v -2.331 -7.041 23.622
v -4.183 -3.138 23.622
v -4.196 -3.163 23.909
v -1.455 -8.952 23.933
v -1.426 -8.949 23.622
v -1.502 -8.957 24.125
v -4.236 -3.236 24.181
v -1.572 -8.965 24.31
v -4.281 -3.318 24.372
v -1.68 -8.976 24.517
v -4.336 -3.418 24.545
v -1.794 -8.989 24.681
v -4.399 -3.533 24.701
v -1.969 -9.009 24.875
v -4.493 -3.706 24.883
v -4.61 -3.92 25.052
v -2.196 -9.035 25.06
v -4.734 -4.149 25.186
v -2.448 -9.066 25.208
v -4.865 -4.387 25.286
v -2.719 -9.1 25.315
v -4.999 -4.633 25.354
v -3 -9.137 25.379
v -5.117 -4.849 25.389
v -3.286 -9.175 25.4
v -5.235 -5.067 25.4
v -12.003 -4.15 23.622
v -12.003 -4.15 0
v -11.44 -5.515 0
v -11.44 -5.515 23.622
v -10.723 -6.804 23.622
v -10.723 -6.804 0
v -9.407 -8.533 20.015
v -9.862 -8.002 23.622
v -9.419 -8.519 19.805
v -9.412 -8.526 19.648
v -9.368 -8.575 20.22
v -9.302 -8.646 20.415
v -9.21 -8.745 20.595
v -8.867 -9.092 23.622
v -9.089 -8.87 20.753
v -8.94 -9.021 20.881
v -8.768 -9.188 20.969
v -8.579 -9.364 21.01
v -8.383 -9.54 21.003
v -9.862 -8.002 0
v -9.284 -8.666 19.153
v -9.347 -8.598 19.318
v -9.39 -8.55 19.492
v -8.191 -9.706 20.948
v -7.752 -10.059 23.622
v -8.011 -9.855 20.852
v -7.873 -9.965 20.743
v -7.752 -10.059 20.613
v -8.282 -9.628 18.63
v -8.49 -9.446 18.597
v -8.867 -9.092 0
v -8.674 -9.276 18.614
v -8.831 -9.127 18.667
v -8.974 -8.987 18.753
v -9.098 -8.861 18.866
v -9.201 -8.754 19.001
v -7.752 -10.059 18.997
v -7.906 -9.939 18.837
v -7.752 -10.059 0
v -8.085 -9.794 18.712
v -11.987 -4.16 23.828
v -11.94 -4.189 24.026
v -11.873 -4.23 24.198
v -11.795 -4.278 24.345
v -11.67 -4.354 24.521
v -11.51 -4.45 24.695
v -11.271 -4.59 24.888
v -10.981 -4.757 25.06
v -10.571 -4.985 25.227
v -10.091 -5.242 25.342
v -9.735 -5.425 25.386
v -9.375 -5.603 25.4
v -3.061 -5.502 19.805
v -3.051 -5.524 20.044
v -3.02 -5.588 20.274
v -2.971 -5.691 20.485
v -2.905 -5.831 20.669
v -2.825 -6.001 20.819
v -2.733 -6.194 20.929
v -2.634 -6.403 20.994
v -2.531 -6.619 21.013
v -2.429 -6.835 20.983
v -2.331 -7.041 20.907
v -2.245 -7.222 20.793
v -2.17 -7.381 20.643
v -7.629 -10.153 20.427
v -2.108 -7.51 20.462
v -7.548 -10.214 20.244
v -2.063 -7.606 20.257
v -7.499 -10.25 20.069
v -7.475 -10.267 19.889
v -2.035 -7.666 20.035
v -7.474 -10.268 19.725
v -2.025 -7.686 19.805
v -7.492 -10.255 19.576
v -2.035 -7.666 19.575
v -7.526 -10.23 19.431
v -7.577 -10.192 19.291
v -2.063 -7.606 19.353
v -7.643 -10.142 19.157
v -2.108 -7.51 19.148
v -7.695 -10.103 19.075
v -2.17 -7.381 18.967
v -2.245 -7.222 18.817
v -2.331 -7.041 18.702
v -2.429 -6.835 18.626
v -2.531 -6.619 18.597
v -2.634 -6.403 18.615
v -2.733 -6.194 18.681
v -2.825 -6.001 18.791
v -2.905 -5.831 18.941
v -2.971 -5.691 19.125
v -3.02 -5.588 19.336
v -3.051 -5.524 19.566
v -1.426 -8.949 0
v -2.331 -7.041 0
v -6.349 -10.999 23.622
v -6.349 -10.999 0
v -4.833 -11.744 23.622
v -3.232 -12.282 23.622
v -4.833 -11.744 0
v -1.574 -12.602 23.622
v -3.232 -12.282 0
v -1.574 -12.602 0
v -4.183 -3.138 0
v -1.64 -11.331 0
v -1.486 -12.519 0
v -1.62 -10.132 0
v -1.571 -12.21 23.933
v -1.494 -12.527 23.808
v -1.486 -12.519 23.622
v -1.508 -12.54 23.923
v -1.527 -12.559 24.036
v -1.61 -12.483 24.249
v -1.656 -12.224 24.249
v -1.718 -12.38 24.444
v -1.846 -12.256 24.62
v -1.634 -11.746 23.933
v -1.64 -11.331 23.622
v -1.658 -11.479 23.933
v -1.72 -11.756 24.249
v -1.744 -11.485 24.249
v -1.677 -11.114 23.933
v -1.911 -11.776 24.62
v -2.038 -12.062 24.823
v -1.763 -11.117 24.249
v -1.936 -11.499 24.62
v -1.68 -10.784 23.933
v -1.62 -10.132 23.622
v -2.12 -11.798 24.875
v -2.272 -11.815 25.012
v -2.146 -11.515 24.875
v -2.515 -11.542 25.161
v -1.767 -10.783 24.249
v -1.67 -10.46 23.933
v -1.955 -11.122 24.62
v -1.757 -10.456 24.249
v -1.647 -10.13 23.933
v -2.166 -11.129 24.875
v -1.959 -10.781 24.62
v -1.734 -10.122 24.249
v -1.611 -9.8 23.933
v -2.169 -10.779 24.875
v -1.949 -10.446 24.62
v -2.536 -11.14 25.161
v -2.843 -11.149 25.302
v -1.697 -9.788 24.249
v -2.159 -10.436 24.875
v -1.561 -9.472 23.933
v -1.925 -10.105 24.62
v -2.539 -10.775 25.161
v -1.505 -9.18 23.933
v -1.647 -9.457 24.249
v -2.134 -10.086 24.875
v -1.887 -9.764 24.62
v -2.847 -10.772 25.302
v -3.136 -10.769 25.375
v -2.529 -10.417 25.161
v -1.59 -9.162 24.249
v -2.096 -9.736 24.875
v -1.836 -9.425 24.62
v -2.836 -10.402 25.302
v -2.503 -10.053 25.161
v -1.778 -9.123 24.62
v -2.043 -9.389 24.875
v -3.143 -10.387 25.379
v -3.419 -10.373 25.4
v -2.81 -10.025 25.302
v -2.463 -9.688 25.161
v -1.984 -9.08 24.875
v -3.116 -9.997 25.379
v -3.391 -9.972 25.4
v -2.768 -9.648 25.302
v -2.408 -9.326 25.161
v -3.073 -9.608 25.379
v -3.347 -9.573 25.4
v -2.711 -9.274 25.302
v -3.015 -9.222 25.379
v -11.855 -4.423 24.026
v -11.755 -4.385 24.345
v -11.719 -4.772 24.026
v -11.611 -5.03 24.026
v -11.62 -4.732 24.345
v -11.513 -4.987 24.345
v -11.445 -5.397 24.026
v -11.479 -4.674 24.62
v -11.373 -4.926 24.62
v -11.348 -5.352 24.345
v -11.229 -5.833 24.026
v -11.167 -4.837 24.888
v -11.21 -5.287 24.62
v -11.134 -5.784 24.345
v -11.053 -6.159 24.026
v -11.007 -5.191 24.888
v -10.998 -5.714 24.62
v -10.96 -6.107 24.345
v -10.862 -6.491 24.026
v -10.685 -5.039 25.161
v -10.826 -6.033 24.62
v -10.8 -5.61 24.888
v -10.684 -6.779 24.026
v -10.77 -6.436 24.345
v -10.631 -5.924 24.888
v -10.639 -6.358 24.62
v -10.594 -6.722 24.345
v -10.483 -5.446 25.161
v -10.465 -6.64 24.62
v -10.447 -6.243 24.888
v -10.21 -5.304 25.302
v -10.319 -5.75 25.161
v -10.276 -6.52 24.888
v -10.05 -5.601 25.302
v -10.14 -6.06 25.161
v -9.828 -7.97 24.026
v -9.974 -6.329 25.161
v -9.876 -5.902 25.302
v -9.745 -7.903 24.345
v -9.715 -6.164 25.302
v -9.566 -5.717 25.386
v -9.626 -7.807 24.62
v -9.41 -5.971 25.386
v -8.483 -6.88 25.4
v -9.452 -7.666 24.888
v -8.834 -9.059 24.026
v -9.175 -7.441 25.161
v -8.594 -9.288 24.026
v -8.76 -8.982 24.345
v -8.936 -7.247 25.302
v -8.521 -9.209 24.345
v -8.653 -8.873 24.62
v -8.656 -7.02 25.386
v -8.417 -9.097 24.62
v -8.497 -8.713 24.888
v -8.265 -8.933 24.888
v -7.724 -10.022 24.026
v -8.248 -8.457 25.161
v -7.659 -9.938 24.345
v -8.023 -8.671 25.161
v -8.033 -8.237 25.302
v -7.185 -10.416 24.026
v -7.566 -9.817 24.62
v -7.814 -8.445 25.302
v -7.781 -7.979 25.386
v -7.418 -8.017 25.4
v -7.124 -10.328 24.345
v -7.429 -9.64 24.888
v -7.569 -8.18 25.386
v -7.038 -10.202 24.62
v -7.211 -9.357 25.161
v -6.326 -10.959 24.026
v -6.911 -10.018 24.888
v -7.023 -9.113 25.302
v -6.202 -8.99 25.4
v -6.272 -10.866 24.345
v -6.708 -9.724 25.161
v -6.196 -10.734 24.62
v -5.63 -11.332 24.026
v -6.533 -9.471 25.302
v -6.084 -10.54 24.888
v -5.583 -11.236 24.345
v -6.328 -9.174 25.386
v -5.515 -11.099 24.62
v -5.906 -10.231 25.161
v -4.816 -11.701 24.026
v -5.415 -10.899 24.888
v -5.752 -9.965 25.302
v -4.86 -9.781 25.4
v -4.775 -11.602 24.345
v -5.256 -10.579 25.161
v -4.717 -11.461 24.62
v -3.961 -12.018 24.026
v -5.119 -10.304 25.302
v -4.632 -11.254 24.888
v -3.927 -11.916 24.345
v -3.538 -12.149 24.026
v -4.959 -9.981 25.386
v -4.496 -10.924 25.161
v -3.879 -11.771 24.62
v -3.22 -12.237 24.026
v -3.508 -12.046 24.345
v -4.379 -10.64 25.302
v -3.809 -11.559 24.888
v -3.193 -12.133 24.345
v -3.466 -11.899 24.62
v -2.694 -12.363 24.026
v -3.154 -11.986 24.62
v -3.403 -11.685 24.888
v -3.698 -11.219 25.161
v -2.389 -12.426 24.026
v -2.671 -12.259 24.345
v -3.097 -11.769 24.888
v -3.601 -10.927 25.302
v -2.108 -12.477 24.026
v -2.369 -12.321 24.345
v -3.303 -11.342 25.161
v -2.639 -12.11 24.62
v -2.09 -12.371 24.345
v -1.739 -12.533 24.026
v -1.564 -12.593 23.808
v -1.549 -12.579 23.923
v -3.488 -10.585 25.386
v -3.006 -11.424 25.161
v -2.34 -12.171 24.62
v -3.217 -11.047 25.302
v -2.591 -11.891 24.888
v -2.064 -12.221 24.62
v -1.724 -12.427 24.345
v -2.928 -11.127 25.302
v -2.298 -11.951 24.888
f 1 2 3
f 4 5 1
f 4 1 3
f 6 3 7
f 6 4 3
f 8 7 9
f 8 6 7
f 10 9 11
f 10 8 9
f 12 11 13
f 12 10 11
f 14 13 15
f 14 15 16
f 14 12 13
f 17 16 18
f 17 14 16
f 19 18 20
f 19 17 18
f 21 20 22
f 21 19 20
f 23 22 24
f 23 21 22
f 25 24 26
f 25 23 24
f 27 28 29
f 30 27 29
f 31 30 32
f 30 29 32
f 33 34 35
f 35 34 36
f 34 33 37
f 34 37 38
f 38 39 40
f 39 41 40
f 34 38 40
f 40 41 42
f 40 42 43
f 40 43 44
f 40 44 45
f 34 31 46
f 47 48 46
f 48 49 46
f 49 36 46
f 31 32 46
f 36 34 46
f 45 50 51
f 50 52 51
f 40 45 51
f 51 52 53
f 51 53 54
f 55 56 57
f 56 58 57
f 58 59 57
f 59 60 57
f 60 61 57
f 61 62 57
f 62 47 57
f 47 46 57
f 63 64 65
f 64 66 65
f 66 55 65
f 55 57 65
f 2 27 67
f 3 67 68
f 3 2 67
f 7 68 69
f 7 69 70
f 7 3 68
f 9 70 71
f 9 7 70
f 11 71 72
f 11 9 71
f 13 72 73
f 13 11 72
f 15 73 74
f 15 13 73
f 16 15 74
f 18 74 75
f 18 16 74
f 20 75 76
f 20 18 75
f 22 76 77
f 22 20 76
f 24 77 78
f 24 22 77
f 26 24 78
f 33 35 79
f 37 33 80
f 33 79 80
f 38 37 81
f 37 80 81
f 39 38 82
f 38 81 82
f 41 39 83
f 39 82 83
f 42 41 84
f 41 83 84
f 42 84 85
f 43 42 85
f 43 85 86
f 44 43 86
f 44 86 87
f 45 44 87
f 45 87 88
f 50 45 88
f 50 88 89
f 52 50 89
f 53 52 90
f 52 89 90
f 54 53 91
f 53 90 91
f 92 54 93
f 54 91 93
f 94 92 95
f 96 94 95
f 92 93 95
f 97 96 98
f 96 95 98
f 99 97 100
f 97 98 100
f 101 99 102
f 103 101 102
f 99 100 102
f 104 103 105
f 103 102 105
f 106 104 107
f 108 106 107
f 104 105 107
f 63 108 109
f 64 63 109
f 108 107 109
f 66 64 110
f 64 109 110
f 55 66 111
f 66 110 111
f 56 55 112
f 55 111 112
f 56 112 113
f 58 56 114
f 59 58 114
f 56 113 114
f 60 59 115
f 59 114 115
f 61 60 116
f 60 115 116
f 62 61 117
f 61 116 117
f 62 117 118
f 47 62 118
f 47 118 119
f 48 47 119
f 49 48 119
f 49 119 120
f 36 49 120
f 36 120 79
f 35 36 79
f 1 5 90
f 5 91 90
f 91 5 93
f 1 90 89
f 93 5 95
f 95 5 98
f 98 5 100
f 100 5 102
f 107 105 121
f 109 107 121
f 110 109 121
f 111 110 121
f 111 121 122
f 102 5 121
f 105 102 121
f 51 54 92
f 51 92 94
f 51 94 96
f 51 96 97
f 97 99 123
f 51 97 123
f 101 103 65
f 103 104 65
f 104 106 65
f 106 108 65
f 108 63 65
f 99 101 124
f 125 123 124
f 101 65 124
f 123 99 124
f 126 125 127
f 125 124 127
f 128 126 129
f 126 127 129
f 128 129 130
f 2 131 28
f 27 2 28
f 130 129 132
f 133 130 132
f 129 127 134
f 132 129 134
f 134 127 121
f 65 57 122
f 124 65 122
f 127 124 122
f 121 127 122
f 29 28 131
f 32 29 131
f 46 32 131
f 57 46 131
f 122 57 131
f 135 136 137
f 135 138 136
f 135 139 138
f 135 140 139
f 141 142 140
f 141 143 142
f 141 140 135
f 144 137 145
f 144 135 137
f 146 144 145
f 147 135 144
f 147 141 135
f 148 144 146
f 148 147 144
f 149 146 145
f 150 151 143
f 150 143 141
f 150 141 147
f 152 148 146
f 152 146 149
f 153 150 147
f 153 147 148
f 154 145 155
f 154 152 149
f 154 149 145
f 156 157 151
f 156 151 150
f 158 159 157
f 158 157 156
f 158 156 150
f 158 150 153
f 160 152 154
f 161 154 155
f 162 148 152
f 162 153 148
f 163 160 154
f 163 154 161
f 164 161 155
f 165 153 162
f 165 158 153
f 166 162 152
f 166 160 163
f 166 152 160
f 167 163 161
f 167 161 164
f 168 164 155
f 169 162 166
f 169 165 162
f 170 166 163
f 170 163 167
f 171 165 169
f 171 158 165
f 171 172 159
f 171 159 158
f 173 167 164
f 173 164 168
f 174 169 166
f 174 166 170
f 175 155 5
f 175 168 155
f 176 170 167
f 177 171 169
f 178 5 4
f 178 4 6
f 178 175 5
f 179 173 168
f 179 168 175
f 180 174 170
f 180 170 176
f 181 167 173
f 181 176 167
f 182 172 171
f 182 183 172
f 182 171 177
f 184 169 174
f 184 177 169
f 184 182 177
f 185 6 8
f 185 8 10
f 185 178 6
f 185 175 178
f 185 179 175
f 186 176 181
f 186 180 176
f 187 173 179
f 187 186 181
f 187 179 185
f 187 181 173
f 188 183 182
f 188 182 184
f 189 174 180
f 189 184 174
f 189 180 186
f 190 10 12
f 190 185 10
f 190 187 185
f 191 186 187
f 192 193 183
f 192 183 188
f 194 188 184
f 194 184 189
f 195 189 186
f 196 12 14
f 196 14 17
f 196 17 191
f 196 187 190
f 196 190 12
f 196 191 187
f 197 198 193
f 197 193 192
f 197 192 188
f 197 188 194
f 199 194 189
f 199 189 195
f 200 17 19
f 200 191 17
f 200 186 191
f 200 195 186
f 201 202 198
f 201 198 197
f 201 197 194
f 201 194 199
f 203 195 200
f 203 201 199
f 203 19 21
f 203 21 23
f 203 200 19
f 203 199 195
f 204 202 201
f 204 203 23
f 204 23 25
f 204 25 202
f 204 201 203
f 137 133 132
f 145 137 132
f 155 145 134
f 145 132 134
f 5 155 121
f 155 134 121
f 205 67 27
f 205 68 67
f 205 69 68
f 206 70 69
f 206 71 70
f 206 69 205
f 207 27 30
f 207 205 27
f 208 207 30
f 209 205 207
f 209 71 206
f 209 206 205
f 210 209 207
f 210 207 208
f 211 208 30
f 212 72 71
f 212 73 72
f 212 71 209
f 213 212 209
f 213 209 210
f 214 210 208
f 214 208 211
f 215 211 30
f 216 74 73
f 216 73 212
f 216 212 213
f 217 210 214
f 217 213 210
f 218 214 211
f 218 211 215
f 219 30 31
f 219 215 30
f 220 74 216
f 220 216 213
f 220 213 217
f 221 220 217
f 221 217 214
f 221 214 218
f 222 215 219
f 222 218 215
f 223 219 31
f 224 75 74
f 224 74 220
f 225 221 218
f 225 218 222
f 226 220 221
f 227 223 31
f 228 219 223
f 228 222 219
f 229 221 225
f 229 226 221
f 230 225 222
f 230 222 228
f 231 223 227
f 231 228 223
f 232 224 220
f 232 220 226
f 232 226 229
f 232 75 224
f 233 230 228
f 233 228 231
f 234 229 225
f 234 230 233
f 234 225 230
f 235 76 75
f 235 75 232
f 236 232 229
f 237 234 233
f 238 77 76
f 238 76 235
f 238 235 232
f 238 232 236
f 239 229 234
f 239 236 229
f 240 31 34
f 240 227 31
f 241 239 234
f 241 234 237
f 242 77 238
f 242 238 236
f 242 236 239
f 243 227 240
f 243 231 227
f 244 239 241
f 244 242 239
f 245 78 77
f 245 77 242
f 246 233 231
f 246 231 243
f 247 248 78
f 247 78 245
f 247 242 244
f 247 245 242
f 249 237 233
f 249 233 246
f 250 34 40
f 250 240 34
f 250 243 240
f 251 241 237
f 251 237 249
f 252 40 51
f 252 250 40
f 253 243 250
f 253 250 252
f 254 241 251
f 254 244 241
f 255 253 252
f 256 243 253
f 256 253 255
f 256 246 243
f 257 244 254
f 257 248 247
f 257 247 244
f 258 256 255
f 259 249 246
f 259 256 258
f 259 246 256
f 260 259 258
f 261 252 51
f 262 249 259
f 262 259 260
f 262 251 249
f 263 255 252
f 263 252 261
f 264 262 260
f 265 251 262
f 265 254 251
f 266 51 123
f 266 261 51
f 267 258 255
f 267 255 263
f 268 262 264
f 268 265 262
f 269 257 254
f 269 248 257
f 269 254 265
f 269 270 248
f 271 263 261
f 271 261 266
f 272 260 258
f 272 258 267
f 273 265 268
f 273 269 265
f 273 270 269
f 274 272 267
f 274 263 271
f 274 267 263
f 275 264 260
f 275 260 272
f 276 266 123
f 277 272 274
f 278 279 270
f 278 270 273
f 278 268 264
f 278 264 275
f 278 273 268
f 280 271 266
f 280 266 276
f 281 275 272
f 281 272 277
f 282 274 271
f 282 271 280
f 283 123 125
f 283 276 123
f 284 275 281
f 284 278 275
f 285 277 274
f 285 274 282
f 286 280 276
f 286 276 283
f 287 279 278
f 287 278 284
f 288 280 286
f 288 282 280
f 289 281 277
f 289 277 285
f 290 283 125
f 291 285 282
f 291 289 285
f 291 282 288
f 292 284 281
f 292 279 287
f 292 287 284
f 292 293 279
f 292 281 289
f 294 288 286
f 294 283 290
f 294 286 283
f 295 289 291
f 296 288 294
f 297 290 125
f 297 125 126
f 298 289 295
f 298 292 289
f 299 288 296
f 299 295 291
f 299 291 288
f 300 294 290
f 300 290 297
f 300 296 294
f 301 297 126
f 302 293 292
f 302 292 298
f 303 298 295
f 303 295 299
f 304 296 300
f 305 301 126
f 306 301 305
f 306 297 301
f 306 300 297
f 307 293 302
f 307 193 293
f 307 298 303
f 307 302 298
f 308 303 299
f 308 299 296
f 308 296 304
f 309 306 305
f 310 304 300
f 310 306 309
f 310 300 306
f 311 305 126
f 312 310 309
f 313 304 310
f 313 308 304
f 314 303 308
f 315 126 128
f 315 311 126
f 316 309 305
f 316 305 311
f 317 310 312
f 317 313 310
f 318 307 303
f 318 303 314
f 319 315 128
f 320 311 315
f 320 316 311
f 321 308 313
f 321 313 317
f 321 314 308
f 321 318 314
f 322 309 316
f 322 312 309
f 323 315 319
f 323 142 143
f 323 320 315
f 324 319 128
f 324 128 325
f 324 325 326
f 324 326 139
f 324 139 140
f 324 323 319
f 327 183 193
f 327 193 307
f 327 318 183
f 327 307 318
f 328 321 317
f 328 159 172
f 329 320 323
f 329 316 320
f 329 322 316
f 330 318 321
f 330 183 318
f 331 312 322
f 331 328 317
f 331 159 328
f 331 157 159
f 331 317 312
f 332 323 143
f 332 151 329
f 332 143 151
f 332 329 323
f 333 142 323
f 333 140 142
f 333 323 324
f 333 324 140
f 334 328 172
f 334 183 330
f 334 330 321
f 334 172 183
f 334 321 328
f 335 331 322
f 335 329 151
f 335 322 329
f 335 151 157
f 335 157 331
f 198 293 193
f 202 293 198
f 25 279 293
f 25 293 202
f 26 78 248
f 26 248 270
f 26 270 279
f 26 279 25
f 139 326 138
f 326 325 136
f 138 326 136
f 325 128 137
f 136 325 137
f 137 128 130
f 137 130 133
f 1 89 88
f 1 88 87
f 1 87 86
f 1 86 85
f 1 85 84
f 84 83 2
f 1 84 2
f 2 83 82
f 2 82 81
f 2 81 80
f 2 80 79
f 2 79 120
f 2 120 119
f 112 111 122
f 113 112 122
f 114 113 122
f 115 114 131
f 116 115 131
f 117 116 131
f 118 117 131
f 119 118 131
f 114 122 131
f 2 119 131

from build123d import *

# Parameters (mm, degrees)
F1_DEPTH    = 25.4
F2_T1_DEPTH = 15.3225079539
F2_T3_DEPTH = 16.775320589
F2_T6_ANGLE = 87.0348581142
F2_T8_ANGLE = 103.9234369613
F3_R        = 1.2082658068
F4_DEPTH    = 25.4


# Not quite as in the source:
# - a fillet or chamfer that OpenCascade refuses, or shapes differently, is made with other operations: its cross-section is extruded or revolved along the edge and cut away or added


with BuildPart() as f1:
    # F0 (on Top) → F1 (new body)
    with BuildSketch(Plane.XY):
        with BuildLine():
            ThreePointArc((-7.752480221, -10.059276834), (-4.8810304794, -8.8387254095), (-2.3312001475, -7.0405778413))
            Line((-2.3312001475, -7.0405778413), (-4.1826744651, -3.1376440612))
            Line((-4.1826744651, -3.1376440612), (-12.0026959047, -4.1503362537))
            ThreePointArc((-12.0026959047, -4.1503362537), (-10.3099777223, -7.4158181858), (-7.752480221, -10.059276834))
        make_face()
        with BuildLine():
            ThreePointArc((-1.4857464298, -12.5192106342), (-1.6518399037, -10.7309962936), (-1.4257026774, -8.9493791841))
            Line((-1.4257026774, -8.9493791841), (-2.3312001475, -7.0405778413))
            ThreePointArc((-2.3312001475, -7.0405778413), (-4.8810304794, -8.8387254095), (-7.752480221, -10.059276834))
            ThreePointArc((-7.752480221, -10.059276834), (-4.8332265428, -11.7443569933), (-1.5735123086, -12.6021450164))
            Line((-1.5735123086, -12.6021450164), (-1.4857464298, -12.5192106342))
        make_face()
    extrude(amount=F1_DEPTH)

    # F2: fillet of radius 1.778 on 4 edges, made by hand

    # F2_s2 → F2_t1 (cut)
    with BuildSketch(Plane(origin=(5.1087634899, -10.7693449534, 0), x_dir=(0, 0, 1), z_dir=(-0.4285998257, 0.9034944324, 0))):
        with BuildLine():
            ThreePointArc((23.622, -5.1238167896), (24.8792358569, -5.6445809326), (25.4, -6.9018167896))
            Line((25.4, -6.9018167896), (25.4, -5.1238167896))
            Line((25.4, -5.1238167896), (23.622, -5.1238167896))
        make_face()
    extrude(amount=F2_T1_DEPTH, mode=Mode.SUBTRACT)

    # F2_s4 → F2_t3 (cut)
    with BuildSketch(Plane(origin=(-0.1051193903, -0.0136129532, 0), x_dir=(0, 0, 1), z_dir=(-0.9917188973, -0.1284275232, 0))):
        with BuildLine():
            ThreePointArc((23.622, -2.5744903868), (24.8792358569, -3.0952545299), (25.4, -4.3524903868))
            Line((25.4, -4.3524903868), (25.4, -2.5744903868))
            Line((25.4, -2.5744903868), (23.622, -2.5744903868))
        make_face()
    extrude(amount=F2_T3_DEPTH, mode=Mode.SUBTRACT)

    # F2_s5 → F2_t6 (revolve, cut)
    with BuildSketch(Plane(origin=(8.4191230763, -9.1705520677, 0), x_dir=(0, 0, 1), z_dir=(0.6762824344, -0.7366424295, 0))):
        with BuildLine():
            ThreePointArc((23.622, 10.7336378697), (24.8792358569, 11.2544020127), (25.4, 12.5116378697))
            Line((25.4, 12.5116378697), (25.4, 10.7336378697))
            Line((25.4, 10.7336378697), (23.622, 10.7336378697))
        make_face()
    revolve(axis=Axis((6.5687949782, -10.8692655012, 25.4), (0, 0, -1)), revolution_arc=F2_T6_ANGLE, mode=Mode.SUBTRACT)

    # F2_s7 → F2_t8 (revolve, cut)
    with BuildSketch(Plane(origin=(0, 0, 0), x_dir=(0, 0, 1), z_dir=(0.017156123, 0.9998528229, 0))):
        with BuildLine():
            ThreePointArc((23.622, -12.7), (24.8792358569, -12.1792358569), (25.4, -10.922))
            Line((25.4, -10.922), (25.4, -12.7))
            Line((25.4, -12.7), (23.622, -12.7))
        make_face()
    revolve(axis=Axis((0, 0, 25.4), (0, 0, 1)), revolution_arc=F2_T8_ANGLE, mode=Mode.SUBTRACT)

    # F3 (on face) → F4 (cut)
    with BuildSketch(Plane(origin=(-4.6293399422, -2.1960669829, 0), x_dir=(-0.4285998257, 0.9034944324, 0), z_dir=(0.9034944324, 0.4285998257, 0))):
        with Locations((-4.8675471917, 19.804911688)):
            Circle(F3_R)
    extrude(amount=-F4_DEPTH, mode=Mode.SUBTRACT)


solid = f1.part
